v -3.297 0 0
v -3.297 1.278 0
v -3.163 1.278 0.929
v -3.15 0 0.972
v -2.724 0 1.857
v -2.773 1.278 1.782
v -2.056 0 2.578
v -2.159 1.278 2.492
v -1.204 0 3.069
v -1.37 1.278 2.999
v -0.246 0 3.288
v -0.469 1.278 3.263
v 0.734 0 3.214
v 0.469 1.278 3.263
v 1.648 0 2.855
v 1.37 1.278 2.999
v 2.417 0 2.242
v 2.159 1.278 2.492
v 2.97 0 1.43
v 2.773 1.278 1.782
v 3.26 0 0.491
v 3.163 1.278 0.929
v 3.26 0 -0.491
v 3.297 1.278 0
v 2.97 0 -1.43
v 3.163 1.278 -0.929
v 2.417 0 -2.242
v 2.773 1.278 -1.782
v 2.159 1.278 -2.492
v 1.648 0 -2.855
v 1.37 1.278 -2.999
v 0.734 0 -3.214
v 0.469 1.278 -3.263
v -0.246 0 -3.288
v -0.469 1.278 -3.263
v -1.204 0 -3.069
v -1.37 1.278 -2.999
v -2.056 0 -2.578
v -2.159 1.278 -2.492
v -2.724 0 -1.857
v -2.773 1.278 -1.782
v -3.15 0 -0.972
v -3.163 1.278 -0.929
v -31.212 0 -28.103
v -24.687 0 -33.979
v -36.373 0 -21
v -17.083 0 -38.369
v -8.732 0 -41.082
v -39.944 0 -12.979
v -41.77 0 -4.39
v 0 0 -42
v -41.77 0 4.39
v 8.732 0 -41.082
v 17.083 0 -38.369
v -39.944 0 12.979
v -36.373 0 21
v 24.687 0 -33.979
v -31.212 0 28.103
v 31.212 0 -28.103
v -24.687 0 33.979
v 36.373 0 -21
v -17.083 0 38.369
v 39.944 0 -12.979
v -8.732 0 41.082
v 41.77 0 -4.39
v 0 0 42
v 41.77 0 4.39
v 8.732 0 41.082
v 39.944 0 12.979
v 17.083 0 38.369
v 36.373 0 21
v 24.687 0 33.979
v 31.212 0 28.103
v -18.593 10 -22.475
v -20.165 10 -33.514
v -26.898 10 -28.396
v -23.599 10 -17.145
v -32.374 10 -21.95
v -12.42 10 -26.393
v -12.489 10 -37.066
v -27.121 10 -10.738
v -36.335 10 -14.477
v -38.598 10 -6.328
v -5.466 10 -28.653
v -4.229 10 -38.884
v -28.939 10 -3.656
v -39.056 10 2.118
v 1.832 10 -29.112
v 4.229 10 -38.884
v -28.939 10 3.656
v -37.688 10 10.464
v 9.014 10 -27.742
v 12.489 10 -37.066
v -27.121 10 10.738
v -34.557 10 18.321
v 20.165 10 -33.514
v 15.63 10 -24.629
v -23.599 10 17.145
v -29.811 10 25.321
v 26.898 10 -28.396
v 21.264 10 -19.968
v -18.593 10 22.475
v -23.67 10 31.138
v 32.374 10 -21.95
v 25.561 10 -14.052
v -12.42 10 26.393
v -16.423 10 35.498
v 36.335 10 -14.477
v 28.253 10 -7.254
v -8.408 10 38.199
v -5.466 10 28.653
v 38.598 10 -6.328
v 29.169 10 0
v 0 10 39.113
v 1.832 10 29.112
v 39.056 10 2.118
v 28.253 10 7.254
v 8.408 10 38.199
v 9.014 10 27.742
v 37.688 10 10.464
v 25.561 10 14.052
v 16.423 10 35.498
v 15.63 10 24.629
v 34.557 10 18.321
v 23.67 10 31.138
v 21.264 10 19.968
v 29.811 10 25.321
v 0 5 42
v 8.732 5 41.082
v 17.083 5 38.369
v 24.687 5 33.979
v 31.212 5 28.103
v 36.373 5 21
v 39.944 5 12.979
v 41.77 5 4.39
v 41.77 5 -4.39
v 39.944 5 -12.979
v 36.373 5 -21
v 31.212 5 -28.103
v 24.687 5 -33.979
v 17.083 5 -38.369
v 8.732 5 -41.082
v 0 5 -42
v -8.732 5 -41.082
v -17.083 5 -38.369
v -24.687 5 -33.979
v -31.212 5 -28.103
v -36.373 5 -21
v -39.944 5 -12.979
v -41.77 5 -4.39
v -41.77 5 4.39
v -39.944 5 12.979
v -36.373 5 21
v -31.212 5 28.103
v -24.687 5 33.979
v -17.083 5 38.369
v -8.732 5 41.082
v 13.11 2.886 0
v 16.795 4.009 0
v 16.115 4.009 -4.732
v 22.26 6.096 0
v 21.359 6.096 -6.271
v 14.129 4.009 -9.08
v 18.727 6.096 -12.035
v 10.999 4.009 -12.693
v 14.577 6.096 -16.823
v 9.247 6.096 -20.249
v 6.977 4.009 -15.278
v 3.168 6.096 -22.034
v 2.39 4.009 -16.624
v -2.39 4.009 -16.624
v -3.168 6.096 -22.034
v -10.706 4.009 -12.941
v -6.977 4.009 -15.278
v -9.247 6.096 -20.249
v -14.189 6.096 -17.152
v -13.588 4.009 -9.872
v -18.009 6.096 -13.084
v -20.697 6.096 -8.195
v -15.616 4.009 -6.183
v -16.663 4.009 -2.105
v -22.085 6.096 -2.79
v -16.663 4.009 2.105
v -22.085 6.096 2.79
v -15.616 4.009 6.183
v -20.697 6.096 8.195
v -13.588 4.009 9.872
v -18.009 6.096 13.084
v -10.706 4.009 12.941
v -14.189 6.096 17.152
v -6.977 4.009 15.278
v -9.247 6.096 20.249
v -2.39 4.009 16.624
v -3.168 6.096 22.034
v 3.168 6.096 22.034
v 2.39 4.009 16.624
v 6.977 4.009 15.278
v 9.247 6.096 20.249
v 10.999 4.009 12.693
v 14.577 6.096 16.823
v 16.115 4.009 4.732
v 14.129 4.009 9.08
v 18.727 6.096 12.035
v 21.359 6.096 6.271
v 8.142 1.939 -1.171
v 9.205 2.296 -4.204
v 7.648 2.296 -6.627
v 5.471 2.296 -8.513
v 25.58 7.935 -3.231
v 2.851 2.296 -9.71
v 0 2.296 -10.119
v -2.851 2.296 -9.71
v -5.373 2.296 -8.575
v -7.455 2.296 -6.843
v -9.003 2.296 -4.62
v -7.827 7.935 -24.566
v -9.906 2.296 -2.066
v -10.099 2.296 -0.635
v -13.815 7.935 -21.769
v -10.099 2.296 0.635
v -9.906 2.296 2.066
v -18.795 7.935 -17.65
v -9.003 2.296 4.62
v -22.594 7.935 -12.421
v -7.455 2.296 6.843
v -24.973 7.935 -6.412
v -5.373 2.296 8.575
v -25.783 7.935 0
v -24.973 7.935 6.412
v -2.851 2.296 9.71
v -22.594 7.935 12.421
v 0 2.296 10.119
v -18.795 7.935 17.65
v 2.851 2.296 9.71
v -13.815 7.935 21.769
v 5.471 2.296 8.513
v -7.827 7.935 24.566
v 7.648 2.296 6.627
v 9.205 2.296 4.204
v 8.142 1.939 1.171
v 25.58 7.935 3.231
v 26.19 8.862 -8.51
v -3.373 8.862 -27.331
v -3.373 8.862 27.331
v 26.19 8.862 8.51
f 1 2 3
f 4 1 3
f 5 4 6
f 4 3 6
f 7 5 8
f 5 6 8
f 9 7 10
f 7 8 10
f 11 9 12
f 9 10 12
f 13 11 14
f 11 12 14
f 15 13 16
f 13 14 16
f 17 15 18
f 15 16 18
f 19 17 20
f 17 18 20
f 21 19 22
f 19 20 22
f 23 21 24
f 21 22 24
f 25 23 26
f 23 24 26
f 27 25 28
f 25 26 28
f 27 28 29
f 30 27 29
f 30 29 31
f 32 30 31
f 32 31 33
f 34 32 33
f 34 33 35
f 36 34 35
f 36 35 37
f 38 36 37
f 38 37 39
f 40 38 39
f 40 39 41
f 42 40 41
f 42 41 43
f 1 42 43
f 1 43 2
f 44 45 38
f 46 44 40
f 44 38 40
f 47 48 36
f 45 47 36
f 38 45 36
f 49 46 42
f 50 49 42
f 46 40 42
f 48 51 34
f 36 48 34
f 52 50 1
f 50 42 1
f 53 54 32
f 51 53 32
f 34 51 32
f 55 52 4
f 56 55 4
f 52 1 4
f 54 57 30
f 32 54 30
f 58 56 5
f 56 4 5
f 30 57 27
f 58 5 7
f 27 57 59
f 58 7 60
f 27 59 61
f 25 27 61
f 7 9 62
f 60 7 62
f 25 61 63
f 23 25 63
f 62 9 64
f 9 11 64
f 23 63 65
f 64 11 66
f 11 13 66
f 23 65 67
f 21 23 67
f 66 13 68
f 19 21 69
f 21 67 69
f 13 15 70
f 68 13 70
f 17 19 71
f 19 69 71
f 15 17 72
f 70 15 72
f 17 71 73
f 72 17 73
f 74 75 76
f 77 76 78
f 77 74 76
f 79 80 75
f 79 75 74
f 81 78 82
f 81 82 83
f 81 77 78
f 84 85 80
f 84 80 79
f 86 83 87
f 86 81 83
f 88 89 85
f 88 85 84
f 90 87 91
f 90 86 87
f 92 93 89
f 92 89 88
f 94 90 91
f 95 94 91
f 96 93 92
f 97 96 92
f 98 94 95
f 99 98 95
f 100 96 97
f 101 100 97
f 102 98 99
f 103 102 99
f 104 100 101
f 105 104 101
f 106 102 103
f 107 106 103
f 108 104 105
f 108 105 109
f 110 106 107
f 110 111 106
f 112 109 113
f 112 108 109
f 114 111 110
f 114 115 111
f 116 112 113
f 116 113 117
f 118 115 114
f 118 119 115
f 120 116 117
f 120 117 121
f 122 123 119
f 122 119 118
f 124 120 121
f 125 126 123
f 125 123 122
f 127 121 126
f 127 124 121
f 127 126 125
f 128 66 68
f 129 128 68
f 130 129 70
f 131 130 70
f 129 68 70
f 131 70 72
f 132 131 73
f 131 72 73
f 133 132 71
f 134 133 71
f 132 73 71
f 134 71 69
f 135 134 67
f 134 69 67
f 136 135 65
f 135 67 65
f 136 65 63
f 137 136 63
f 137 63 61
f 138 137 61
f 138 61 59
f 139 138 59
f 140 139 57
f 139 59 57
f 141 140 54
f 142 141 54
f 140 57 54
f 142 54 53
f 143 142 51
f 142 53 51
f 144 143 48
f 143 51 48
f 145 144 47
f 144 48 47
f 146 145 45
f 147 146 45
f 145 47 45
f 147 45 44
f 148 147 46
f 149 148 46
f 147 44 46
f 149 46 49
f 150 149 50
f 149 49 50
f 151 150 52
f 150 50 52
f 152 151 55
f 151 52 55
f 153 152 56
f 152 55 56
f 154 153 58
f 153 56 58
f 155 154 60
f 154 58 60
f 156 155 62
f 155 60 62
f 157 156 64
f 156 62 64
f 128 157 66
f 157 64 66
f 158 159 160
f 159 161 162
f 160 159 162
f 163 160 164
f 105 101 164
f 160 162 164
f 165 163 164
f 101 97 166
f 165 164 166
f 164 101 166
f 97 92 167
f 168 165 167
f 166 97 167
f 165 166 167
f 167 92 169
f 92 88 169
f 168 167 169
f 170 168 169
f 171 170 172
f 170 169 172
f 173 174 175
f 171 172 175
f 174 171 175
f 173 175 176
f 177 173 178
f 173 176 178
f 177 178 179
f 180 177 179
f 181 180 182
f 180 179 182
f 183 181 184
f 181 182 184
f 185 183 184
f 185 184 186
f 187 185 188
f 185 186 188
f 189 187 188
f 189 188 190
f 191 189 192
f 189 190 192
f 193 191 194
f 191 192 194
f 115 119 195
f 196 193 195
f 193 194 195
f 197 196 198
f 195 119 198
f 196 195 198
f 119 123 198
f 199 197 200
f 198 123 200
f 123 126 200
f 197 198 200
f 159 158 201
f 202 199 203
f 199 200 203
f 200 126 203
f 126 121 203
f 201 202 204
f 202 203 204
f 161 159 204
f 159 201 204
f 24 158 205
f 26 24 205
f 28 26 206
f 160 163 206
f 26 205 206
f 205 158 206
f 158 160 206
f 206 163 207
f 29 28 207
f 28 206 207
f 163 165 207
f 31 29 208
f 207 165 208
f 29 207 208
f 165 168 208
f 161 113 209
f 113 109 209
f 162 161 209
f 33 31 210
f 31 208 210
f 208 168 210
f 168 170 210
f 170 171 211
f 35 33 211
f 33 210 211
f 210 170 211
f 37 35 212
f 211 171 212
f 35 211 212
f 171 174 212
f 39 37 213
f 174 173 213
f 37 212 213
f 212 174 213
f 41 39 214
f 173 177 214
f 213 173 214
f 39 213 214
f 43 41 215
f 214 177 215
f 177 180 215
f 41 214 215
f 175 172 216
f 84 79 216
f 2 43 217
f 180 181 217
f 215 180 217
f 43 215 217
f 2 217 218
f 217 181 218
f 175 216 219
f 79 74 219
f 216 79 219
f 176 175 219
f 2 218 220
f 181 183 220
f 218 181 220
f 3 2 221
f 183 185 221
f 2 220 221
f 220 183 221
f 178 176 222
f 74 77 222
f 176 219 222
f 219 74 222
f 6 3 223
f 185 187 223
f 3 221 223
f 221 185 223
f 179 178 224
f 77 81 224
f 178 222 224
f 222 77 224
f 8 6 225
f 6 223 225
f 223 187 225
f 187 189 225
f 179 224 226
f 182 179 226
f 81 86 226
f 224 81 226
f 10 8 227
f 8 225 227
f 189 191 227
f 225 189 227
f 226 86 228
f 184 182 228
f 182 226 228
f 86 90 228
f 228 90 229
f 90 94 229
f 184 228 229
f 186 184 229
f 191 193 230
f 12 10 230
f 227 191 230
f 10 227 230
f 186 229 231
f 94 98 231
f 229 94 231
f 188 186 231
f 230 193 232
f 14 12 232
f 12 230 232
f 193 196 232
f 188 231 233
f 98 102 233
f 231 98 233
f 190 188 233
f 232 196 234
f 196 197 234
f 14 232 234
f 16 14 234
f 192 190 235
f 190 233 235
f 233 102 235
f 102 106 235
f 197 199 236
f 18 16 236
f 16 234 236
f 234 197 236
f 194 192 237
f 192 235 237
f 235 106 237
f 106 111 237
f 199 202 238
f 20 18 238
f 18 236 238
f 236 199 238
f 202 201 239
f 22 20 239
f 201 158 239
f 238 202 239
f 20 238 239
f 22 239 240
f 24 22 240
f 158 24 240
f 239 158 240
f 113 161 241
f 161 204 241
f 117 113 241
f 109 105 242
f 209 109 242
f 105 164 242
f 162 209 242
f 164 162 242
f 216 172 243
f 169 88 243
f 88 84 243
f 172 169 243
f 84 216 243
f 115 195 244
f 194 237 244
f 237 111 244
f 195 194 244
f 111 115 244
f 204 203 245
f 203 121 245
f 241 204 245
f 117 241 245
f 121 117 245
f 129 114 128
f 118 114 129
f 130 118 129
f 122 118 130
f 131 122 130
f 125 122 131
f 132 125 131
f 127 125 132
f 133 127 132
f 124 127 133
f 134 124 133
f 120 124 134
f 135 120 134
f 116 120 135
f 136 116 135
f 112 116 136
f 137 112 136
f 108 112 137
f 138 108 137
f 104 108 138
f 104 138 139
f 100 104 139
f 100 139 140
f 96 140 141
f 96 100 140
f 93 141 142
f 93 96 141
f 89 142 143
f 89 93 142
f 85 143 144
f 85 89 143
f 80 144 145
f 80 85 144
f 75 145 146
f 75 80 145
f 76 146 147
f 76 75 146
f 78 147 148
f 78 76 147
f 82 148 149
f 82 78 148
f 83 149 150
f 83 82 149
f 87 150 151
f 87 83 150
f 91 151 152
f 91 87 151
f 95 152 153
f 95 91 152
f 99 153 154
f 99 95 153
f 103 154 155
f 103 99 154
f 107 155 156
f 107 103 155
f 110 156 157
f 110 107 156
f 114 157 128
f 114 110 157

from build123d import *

# Parameters (mm, degrees)
SKETCH1_R           = 42
BOSS_EXTRUDE1_DEPTH = 10
CAVITY1_OUTLINE_W   = 3.296807109
CAVITY1_OUTLINE_H   = 8.722003862
SKETCH2_R           = 3.296807109
CUT_EXTRUDE1_DEPTH  = 61.033934998
CHAMFER1_SIZE       = 5
CHAMFER1_SIZE2      = 2.886751346


# Read off the part's stored shape, not the designer's step: Cavity1
with BuildPart() as part:
    # Sketch1 → Boss-Extrude1 (new body)
    with BuildSketch(Plane(origin=(0, 0, 0), x_dir=(1, 0, 0), z_dir=(0, 1, 0))):
        with Locations(Location((0, 0, 0), (0, 0, 270))):
            Circle(SKETCH1_R)
    extrude(amount=BOSS_EXTRUDE1_DEPTH)

    # Cavity1 outline → Cavity1 (revolve, cut)
    with BuildSketch(Plane.XY):
        with BuildLine():
            Line((3.296807109, 10.0000001), (3.296807109, 1.277996238))
            add(Edge.make_bspline(
                [(3.296807109, 1.277996238), (4.197169621, 1.438365635), (5.69903079, 1.462039555), (7.693496911, 1.848305194), (9.272215478, 2.121674562), (10.750690756, 2.424226191), (12.181632664, 2.720278367), (13.637151846, 2.964975868), (14.864343001, 3.366330129), (15.911496119, 3.711763684), (16.810008215, 4.028877941), (17.733867067, 4.263051977), (18.837916963, 4.636362632), (19.930975123, 5.084503164), (21.068588771, 5.583149701), (22.140955467, 6.015297), (23.215588995, 6.59235717), (24.437095613, 7.161677421), (25.676203543, 7.926154231), (27.106557761, 8.526198992), (28.218828126, 9.339118125), (28.906345613, 9.816936011), (29.169378211, 10)],
                knots=[0, 0, 0, 0, 0.061584864, 0.100794932, 0.136830735, 0.169700167, 0.20256895, 0.235437771, 0.269088288, 0.289472528, 0.309858244, 0.333318894, 0.353706298, 0.388422523, 0.412964695, 0.437513727, 0.466339542, 0.495168076, 0.528353594, 0.564387379, 0.599250153, 0.620877664, 0.620877664, 0.620877664, 0.620877664], degree=3))
            Line((29.169378211, 10), (3.296807109, 10.0000001))
        make_face()
        with Locations((1.648403555, 5.638998169)):
            Rectangle(CAVITY1_OUTLINE_W, CAVITY1_OUTLINE_H)
    revolve(axis=Axis((0, 0, 0), (0, 1, 0)), mode=Mode.SUBTRACT)

    # Sketch2 → Cut-Extrude1 (cut, through all)
    with BuildSketch(Plane(origin=(0, 1.277996238, 0), x_dir=(1, 0, 0), z_dir=(0, 1, 0))):
        with Locations(Location((0, 0, 0), (0, 0, 180))):
            Circle(SKETCH2_R)
    extrude(amount=-CUT_EXTRUDE1_DEPTH, mode=Mode.SUBTRACT)

    # Chamfer1
    chamfer1_edges = [part.edges().sort_by_distance(p)[0] for p in [
        (0, 10, -42),
    ]]
    chamfer1_side = [part.faces().sort_by_distance(p)[0] for p in [
        (0, 5, -42),
    ]]
    chamfer(chamfer1_edges, length=CHAMFER1_SIZE, length2=CHAMFER1_SIZE2, reference=chamfer1_side[0])


solid = part.part
